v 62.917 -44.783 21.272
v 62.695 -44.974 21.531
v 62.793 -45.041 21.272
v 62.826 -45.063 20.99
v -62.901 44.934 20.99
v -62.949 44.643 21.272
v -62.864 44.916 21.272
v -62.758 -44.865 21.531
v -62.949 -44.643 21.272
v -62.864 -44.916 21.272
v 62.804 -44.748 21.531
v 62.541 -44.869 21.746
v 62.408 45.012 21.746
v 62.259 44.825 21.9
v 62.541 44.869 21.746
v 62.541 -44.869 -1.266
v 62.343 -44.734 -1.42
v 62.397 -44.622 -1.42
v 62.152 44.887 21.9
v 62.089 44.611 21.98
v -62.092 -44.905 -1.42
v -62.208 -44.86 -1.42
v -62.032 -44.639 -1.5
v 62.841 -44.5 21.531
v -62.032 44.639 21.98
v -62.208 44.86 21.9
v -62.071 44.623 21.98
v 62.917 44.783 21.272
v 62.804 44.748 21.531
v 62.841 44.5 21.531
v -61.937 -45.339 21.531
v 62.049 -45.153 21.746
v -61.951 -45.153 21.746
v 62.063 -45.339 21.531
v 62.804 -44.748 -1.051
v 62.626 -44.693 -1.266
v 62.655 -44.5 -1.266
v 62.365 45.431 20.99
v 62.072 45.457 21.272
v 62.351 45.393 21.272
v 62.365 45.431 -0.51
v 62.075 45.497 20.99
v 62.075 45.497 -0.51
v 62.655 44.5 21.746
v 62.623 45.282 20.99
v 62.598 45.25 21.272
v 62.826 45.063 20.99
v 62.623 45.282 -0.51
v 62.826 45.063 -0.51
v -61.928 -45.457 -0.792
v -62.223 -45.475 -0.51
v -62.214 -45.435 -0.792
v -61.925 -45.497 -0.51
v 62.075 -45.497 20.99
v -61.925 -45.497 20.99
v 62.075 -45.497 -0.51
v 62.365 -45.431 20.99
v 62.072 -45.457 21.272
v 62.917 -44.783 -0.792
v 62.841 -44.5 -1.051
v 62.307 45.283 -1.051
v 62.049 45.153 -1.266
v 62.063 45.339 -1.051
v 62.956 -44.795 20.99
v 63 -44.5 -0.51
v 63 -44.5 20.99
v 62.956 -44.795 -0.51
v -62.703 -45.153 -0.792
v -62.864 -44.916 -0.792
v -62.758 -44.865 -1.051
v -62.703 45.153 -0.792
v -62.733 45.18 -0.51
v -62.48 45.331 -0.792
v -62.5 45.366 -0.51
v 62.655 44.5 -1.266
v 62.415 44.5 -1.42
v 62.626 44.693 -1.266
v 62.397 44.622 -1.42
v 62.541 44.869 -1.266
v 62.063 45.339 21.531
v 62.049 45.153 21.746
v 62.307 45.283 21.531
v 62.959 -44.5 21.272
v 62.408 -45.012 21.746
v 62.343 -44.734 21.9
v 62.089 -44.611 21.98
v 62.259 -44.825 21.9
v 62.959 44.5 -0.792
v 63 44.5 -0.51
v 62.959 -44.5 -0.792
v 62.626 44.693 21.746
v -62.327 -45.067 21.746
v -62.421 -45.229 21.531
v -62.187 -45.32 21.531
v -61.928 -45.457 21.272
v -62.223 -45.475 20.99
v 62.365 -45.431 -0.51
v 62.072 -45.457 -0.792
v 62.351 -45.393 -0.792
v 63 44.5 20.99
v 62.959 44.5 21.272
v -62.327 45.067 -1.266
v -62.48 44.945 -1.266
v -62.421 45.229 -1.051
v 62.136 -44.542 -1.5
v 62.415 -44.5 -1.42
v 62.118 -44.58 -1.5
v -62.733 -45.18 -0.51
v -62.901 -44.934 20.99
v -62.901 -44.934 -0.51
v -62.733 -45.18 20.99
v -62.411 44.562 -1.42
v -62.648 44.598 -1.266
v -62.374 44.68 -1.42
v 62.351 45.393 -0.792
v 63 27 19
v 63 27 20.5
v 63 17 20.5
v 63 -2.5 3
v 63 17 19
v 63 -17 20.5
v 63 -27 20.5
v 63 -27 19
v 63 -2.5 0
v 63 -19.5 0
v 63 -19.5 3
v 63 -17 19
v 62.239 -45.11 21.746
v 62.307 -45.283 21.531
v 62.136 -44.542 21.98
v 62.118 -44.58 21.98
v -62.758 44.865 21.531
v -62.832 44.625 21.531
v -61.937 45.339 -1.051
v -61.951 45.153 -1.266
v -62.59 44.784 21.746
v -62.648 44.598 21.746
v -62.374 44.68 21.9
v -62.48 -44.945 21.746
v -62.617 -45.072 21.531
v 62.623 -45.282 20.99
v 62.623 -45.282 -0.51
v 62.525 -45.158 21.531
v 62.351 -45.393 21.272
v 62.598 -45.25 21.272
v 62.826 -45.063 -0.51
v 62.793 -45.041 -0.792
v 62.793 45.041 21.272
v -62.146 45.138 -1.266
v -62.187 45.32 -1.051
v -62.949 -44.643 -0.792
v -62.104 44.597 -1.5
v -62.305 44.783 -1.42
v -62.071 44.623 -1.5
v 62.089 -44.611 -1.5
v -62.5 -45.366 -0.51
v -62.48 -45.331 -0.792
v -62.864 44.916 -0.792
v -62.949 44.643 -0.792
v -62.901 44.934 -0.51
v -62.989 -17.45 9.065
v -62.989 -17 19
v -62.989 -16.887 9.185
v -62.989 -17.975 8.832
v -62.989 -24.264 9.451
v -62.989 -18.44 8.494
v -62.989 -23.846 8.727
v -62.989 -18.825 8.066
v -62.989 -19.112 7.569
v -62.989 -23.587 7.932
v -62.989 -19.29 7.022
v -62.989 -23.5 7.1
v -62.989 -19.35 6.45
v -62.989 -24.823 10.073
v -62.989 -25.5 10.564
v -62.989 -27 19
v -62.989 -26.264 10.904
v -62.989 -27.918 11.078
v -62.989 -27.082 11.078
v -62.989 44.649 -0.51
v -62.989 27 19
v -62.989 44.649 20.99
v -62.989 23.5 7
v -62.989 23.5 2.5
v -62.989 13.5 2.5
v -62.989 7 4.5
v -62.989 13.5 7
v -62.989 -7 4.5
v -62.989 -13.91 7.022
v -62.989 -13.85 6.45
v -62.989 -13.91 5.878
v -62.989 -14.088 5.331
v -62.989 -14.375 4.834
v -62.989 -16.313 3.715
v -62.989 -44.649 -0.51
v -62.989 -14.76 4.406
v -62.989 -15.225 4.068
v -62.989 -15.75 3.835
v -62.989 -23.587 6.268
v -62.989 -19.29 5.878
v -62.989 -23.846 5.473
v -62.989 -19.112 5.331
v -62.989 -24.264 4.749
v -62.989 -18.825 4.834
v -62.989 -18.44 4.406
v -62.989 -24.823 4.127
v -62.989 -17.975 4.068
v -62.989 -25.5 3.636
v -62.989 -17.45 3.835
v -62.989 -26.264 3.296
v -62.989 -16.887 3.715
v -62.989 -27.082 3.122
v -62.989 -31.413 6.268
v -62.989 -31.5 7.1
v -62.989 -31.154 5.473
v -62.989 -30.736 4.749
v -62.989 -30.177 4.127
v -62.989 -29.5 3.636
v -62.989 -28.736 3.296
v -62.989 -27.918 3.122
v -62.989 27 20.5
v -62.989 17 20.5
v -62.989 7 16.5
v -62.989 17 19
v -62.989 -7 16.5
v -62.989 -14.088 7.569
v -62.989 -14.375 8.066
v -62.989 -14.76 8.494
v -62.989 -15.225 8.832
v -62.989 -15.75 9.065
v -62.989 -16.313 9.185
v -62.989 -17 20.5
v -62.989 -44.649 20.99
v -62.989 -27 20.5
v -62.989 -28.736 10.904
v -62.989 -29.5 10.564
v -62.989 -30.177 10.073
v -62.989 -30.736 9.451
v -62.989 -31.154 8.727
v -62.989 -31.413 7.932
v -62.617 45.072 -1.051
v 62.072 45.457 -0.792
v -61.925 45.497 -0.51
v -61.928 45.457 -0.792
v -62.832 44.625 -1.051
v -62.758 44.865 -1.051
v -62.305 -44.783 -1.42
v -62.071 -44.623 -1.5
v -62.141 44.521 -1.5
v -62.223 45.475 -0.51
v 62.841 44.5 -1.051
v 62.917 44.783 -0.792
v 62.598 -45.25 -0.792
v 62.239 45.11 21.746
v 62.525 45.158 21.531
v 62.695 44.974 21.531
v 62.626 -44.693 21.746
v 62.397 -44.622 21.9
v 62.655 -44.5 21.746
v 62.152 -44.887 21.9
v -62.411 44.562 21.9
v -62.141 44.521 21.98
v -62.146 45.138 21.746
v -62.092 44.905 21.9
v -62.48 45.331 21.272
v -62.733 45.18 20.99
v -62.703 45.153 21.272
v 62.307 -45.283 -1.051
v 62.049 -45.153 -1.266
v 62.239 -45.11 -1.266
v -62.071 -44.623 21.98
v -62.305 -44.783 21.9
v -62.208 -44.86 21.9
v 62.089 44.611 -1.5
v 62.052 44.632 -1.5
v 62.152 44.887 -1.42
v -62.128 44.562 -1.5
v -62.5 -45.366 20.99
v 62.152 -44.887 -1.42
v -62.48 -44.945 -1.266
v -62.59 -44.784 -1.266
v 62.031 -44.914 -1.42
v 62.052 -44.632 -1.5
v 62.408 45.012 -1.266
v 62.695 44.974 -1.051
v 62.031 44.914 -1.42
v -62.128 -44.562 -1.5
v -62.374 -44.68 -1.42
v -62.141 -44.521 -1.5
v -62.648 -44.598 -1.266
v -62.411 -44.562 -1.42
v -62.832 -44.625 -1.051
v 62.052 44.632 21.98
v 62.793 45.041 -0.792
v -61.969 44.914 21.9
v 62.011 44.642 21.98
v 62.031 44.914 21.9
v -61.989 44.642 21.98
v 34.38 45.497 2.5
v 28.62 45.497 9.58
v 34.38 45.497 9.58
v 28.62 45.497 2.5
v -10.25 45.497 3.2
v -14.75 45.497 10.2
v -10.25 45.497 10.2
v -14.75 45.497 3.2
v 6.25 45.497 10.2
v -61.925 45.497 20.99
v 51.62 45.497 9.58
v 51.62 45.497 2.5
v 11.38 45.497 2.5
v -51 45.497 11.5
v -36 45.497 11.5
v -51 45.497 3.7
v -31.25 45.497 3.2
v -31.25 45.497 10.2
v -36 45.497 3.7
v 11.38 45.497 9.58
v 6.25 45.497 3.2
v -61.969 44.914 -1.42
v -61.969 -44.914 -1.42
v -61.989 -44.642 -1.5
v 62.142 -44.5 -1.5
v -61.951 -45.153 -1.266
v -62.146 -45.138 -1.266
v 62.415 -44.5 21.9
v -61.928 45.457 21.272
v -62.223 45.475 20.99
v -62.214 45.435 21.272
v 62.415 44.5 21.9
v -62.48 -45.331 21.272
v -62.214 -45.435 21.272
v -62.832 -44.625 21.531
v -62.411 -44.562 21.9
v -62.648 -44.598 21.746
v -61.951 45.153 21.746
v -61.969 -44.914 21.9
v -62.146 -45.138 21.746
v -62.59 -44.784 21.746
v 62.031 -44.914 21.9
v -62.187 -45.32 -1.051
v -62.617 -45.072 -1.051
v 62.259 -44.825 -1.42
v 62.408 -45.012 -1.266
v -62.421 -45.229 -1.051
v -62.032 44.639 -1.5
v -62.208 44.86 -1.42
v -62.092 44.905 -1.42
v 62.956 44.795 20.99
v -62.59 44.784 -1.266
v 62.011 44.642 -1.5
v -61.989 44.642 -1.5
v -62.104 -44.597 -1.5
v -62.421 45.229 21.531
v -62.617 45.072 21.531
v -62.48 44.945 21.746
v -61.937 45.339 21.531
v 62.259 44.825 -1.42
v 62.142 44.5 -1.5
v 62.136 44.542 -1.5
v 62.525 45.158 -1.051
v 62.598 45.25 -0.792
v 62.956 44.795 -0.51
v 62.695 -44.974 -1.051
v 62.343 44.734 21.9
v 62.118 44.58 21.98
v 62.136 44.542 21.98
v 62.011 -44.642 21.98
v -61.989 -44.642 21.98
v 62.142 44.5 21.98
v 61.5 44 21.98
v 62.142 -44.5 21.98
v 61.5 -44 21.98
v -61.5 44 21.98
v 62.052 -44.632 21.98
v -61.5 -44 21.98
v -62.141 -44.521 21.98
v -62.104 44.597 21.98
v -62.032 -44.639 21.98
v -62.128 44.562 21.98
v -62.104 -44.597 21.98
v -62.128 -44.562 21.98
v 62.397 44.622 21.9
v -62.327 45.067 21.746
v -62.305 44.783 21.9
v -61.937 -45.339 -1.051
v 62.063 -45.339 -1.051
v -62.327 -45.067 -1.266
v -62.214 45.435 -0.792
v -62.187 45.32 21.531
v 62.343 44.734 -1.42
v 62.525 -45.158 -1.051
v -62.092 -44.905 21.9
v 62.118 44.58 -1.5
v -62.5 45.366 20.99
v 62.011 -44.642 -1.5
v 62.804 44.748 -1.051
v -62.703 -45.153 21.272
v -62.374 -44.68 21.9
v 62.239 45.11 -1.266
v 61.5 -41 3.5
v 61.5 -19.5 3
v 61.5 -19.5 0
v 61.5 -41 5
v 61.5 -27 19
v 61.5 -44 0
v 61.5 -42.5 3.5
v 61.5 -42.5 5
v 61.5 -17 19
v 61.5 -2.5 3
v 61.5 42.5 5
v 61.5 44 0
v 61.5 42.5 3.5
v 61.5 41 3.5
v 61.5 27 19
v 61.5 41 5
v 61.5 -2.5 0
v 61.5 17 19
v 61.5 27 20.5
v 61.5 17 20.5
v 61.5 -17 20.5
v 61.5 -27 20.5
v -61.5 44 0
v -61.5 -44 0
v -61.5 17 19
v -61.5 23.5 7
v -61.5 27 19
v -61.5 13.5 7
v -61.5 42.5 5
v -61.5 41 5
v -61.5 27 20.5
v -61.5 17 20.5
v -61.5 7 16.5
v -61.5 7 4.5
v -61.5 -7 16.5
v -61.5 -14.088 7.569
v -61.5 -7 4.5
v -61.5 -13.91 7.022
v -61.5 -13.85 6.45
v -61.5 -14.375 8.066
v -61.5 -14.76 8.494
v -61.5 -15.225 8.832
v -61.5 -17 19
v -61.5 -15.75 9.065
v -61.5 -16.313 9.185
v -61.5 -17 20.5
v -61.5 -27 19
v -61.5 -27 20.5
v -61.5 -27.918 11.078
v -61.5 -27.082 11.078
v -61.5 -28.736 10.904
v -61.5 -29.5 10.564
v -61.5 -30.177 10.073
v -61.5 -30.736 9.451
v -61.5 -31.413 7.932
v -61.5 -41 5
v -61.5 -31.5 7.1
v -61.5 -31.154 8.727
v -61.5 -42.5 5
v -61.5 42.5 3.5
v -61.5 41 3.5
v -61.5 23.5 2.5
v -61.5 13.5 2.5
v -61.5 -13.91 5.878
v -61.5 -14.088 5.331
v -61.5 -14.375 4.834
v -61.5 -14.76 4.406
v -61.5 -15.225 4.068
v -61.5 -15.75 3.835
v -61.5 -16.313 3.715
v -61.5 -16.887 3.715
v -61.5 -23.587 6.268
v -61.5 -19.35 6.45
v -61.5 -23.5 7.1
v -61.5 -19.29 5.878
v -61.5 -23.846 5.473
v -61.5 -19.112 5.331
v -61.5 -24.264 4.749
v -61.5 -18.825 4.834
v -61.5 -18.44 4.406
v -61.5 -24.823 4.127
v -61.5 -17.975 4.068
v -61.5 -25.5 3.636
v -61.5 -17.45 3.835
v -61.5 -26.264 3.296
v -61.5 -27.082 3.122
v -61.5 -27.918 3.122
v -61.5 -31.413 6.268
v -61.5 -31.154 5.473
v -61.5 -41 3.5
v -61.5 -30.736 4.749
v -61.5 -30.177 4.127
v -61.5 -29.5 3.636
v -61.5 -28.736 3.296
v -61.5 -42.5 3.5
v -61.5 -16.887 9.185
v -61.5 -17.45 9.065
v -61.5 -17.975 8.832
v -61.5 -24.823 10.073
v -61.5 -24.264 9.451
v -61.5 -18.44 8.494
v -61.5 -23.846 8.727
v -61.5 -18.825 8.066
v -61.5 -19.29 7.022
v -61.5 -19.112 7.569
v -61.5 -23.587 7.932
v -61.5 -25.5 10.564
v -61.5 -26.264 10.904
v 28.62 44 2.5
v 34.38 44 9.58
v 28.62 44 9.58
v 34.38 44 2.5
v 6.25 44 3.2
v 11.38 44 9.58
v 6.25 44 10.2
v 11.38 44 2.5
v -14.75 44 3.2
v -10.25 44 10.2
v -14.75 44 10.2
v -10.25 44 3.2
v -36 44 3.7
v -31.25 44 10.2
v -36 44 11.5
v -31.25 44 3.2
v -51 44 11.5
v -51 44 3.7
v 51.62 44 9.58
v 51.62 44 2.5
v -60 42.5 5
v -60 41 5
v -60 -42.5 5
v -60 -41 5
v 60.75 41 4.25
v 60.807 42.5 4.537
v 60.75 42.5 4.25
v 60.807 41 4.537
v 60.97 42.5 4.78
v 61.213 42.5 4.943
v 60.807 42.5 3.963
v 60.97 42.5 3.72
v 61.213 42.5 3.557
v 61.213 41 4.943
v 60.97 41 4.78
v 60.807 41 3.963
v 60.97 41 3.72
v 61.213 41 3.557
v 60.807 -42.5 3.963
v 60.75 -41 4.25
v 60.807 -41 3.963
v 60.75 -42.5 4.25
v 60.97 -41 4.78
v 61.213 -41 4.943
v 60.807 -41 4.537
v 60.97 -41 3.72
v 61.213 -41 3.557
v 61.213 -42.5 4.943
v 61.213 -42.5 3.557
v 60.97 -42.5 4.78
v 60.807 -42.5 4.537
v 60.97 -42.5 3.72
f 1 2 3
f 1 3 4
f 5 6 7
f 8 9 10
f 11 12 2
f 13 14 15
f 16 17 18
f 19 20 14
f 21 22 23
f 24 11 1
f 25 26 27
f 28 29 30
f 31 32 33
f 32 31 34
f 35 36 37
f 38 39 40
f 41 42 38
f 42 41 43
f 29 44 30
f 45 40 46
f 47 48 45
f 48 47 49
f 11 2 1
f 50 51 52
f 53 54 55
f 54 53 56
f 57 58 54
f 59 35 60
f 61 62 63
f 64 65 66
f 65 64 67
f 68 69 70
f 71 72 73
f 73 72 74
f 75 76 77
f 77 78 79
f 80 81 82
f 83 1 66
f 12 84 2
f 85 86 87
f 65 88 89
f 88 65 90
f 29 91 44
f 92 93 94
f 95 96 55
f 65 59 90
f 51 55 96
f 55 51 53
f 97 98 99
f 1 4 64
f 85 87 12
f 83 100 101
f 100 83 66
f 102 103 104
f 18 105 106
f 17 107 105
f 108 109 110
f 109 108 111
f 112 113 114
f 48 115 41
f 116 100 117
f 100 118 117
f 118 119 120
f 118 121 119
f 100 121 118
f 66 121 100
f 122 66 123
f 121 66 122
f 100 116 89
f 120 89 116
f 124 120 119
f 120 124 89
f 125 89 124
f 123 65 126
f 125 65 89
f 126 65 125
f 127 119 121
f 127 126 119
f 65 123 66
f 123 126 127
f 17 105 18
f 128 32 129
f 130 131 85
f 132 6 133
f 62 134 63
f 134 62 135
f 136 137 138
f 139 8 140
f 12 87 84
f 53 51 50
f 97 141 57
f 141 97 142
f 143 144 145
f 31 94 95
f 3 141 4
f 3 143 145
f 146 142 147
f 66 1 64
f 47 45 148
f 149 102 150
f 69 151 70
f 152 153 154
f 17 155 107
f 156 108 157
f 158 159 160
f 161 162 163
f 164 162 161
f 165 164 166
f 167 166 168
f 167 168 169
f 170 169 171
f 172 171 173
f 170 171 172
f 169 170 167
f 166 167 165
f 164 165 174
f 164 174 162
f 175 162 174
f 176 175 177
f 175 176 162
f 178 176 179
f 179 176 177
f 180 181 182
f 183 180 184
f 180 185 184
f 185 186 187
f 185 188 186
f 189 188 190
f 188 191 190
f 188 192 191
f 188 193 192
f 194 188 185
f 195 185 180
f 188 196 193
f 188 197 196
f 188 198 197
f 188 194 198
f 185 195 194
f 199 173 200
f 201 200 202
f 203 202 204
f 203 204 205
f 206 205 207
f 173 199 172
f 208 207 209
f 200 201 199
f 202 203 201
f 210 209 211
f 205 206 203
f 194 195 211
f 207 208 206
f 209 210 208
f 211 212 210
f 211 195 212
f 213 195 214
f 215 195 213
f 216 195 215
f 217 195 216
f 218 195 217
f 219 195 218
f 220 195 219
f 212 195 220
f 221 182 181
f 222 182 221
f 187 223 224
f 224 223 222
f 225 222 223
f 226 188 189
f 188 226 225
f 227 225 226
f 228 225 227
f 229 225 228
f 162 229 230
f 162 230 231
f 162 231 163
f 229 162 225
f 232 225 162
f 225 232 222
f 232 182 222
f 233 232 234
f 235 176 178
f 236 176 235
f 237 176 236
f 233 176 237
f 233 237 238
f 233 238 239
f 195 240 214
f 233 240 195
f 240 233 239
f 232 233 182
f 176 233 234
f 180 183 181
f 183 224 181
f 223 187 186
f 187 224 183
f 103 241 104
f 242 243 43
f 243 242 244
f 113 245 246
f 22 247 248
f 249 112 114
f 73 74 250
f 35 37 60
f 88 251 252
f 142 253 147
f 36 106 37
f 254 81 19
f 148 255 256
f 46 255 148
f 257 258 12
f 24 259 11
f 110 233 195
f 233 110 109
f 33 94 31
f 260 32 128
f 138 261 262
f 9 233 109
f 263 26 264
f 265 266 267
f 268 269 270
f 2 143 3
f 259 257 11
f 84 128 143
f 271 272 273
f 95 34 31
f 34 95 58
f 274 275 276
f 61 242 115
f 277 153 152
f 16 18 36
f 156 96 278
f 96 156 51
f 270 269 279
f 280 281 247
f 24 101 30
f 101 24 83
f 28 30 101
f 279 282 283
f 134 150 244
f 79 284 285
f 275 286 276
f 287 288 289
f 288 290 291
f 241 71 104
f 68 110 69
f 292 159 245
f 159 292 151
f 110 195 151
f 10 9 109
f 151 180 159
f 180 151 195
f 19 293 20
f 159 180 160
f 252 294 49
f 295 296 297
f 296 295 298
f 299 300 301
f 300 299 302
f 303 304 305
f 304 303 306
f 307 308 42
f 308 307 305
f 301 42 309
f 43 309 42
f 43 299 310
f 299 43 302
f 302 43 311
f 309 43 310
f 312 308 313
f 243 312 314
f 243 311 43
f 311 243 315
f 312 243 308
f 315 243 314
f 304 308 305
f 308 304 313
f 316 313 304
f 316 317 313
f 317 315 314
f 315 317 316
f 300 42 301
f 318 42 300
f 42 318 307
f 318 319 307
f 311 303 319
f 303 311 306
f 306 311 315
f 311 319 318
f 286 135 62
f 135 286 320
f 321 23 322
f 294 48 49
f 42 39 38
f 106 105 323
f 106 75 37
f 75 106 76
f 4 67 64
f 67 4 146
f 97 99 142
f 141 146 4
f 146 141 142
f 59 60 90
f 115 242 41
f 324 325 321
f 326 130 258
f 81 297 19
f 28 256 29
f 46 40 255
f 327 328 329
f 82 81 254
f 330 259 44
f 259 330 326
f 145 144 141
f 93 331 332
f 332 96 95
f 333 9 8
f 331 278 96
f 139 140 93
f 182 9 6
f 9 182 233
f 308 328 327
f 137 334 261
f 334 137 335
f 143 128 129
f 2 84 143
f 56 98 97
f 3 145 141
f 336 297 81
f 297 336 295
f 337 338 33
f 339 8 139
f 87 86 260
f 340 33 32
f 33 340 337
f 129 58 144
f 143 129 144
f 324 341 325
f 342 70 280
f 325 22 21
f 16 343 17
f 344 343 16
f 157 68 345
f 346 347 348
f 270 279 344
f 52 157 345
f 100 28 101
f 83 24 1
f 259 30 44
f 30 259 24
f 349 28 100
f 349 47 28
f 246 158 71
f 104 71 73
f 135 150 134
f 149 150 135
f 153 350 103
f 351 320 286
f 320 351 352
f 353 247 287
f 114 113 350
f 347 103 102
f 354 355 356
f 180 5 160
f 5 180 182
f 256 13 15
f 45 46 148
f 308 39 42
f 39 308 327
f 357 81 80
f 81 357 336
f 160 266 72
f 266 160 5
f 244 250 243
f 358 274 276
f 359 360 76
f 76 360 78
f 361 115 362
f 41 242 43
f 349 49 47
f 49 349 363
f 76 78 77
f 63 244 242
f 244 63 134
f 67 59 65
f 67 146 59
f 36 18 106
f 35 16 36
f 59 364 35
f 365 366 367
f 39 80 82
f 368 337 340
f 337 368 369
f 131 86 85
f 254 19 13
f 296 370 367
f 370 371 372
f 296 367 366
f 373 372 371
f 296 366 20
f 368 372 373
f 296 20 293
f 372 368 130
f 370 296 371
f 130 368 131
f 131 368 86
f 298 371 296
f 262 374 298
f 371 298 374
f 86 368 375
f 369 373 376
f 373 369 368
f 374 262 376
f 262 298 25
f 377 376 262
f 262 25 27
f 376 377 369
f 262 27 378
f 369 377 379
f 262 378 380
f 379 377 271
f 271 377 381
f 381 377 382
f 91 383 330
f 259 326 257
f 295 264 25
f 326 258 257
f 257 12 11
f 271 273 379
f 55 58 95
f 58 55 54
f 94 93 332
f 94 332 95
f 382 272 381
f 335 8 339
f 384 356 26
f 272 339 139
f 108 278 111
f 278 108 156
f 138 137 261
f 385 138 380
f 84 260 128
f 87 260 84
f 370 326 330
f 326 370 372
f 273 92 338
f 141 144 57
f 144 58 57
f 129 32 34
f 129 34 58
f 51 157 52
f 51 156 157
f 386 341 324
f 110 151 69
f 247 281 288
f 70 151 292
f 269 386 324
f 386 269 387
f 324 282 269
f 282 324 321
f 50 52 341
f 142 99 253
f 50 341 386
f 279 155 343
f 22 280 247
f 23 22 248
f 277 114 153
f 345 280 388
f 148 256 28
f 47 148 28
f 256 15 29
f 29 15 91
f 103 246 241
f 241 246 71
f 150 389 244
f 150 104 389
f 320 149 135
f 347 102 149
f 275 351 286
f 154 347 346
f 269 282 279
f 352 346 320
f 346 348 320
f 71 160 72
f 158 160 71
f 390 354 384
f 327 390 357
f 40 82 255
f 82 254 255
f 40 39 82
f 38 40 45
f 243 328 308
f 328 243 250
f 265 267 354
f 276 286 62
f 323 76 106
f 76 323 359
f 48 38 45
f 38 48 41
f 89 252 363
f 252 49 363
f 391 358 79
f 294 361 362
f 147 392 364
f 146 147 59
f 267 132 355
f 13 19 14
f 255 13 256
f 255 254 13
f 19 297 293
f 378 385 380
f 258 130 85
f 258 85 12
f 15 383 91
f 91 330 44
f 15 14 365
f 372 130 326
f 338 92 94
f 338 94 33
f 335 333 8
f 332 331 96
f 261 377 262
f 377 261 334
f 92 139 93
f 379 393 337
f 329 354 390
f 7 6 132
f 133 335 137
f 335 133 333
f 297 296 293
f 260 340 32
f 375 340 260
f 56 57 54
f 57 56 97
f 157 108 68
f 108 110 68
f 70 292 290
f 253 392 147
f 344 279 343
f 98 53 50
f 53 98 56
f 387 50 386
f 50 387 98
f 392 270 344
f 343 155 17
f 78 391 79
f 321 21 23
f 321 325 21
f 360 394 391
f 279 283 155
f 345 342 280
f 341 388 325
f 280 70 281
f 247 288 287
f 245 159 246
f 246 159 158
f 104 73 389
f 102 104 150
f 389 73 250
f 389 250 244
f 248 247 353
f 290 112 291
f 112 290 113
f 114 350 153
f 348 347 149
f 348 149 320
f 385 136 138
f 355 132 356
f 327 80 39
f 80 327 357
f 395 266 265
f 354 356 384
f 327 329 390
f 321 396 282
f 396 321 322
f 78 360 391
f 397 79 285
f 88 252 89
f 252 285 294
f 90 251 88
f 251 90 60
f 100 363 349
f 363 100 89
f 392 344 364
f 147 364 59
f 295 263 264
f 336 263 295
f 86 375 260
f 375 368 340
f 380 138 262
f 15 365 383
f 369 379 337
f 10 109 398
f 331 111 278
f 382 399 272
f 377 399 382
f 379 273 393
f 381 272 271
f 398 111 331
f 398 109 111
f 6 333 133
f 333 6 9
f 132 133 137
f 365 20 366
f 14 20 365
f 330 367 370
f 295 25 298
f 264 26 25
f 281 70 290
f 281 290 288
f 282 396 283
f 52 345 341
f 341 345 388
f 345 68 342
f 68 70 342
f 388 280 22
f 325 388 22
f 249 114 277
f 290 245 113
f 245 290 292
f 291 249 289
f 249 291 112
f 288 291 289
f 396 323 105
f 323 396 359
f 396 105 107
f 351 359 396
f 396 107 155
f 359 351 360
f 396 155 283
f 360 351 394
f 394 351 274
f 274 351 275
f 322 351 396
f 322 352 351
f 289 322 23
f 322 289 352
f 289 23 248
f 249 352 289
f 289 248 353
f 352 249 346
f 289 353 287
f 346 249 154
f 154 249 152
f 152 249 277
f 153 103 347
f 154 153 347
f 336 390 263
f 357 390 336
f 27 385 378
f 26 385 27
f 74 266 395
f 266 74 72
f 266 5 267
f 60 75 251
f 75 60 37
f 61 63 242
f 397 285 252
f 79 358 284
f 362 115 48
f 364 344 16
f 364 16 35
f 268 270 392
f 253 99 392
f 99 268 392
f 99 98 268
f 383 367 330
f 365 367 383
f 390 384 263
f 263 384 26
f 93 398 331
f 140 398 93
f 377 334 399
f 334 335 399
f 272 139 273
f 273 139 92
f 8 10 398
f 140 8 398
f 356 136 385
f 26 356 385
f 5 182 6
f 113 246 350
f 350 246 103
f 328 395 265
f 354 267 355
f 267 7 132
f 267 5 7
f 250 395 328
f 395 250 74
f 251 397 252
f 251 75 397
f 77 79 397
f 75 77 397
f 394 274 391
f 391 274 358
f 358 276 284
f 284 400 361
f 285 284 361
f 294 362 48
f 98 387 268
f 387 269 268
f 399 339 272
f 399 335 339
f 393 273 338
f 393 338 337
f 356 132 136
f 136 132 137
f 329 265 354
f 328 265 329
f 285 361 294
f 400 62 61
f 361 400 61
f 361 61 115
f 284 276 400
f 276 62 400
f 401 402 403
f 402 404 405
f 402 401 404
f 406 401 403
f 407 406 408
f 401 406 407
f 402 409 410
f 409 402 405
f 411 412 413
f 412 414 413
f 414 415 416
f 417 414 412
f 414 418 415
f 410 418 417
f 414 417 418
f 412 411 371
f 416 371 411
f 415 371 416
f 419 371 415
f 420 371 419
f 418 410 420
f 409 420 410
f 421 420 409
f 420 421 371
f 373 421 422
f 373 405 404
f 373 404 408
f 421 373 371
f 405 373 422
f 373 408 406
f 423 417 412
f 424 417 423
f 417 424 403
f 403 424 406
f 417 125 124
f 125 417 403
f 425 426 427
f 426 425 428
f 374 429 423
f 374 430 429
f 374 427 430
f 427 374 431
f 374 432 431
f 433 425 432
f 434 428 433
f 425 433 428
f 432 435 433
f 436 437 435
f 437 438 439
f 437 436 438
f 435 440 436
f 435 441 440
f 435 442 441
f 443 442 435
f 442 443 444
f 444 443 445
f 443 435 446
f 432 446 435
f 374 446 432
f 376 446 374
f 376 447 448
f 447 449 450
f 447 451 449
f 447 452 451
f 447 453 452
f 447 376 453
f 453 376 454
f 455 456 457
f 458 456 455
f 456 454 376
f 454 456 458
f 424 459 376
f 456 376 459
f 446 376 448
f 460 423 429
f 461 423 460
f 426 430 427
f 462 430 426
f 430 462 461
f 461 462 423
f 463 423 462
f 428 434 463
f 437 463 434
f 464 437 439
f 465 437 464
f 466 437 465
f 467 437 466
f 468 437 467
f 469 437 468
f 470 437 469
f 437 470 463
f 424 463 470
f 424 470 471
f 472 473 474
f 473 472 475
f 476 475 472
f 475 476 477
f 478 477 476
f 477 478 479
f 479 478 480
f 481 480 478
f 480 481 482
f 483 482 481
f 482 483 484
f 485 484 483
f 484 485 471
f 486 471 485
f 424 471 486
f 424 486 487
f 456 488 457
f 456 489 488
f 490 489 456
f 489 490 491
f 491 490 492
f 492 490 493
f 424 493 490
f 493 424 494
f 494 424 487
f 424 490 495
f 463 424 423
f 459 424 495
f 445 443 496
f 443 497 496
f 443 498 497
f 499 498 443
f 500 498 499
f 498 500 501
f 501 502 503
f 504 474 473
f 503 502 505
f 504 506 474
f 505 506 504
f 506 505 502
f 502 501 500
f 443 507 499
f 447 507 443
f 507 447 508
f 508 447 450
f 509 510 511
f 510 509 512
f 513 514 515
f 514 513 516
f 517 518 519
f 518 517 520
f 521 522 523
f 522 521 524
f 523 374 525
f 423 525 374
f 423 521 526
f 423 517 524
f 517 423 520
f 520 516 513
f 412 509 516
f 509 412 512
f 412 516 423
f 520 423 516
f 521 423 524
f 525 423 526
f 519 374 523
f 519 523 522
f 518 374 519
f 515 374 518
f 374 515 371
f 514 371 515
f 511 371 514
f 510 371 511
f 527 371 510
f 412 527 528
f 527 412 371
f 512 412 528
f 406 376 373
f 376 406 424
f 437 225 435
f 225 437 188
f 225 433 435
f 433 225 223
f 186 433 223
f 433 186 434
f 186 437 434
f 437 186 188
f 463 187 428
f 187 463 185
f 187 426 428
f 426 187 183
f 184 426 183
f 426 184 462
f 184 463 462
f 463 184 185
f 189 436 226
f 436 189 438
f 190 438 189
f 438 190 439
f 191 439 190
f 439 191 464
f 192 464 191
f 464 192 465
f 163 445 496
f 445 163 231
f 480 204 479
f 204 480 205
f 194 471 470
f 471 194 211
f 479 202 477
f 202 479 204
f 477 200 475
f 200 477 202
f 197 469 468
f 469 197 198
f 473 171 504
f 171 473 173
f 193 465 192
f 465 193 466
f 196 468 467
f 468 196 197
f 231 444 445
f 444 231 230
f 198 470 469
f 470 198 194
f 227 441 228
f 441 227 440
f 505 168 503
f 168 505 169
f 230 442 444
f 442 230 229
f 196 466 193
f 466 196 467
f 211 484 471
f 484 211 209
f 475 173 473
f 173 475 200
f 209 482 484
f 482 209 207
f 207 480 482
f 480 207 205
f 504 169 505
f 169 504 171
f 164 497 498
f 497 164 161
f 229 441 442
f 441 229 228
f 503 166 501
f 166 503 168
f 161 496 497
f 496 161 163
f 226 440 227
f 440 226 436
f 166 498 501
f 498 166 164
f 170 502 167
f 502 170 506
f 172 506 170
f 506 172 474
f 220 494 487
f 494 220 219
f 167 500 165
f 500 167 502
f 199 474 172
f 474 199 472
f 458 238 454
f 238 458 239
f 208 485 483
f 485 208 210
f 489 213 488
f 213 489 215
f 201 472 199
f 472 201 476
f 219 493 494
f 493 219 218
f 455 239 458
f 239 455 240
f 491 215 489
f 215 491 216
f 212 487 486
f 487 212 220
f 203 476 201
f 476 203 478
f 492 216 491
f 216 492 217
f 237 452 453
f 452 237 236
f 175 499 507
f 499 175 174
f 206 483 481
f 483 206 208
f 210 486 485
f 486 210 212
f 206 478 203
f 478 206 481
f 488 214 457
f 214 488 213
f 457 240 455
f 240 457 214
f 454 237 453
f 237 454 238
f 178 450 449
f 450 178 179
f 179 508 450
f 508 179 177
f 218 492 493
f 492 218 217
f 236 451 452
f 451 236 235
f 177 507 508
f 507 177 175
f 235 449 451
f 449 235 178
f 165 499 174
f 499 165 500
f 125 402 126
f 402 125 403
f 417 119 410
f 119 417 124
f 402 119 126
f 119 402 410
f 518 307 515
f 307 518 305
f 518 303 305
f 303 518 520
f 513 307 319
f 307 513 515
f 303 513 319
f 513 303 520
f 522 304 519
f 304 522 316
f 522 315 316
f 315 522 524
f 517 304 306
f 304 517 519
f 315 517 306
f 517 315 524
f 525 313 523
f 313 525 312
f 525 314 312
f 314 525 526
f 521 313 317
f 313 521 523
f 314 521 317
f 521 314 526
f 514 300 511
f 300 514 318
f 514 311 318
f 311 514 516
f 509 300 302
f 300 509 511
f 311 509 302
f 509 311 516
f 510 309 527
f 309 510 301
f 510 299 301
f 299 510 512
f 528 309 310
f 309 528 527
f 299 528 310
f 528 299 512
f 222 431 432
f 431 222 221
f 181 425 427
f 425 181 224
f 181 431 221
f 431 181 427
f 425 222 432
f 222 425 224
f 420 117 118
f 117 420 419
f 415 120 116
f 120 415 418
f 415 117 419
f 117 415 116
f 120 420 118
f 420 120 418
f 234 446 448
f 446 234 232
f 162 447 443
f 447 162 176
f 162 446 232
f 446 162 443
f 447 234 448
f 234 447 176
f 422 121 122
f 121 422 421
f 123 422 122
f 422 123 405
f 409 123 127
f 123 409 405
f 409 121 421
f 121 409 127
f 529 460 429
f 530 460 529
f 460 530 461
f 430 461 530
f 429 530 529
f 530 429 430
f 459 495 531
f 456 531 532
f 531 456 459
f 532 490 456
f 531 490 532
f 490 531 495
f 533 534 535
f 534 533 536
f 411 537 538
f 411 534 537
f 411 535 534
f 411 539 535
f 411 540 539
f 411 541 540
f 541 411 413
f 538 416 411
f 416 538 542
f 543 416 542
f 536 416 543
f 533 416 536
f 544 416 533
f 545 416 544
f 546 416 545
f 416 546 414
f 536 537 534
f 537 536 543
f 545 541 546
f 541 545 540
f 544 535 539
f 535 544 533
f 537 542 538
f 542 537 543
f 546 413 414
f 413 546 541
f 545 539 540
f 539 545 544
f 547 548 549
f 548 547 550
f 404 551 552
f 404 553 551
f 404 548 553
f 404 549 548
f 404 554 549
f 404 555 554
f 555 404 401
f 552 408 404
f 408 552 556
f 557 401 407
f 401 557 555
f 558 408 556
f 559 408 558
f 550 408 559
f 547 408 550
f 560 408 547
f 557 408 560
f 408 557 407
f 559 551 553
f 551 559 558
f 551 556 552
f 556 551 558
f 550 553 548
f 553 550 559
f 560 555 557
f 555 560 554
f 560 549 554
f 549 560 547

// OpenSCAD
// file: vars.scad
$fs = 0.3;

epsilon = 0.01;
wall_thickness = 1.5;
rounded_corner_radius = 1;
board_thickness = 1.5;
board_sit_height = 2;
inner_dim = [123, 88, 22];
mid_dist = [inner_dim[0]/2 + wall_thickness/2, inner_dim[1]/2 + wall_thickness/2, inner_dim[2]/2 + wall_thickness/2];

top_tab_width = 10;
top_tab_thickness = 1.5;
text_height = 0.5;
// file: roundedcube.scad
// https://danielupshaw.com/openscad-rounded-corners/
module roundedcube(size = [1, 1, 1], center = false, radius = 0.5, apply_to = "all") {
	// If single value, convert to [x, y, z] vector
	size = (size[0] == undef) ? [size, size, size] : size;

	translate_min = radius;
	translate_xmax = size[0] - radius;
	translate_ymax = size[1] - radius;
	translate_zmax = size[2] - radius;

	diameter = radius * 2;

	obj_translate = (center == false) ?
		[0, 0, 0] : [
			-(size[0] / 2),
			-(size[1] / 2),
			-(size[2] / 2)
		];

	translate(v = obj_translate) {
		hull() {
			for (translate_x = [translate_min, translate_xmax]) {
				x_at = (translate_x == translate_min) ? "min" : "max";
				for (translate_y = [translate_min, translate_ymax]) {
					y_at = (translate_y == translate_min) ? "min" : "max";
					for (translate_z = [translate_min, translate_zmax]) {
						z_at = (translate_z == translate_min) ? "min" : "max";

						translate(v = [translate_x, translate_y, translate_z])
						if (
							(apply_to == "all") ||
							(apply_to == "xmin" && x_at == "min") || (apply_to == "xmax" && x_at == "max") ||
							(apply_to == "ymin" && y_at == "min") || (apply_to == "ymax" && y_at == "max") ||
							(apply_to == "zmin" && z_at == "min") || (apply_to == "zmax" && z_at == "max")
						) {
							sphere(r = radius);
						} else {
							rotate =
								(apply_to == "xmin" || apply_to == "xmax" || apply_to == "x") ? [0, 90, 0] : (
								(apply_to == "ymin" || apply_to == "ymax" || apply_to == "y") ? [90, 90, 0] :
								[0, 0, 0]
							);
							rotate(a = rotate)
							cylinder(h = diameter, r = radius, center = true);
						}
					}
				}
			}
		}
	}
}
// file: cutouts.scad
margin = 1;

module _square(w, h) {
	translate([0, h/2])
	square([w+2*margin, h+2*margin], center=true);
}

module _circle(r) {
	translate([0, r])
	circle(r + margin);
}

module hdmi() {
	translate([0, 0.7, 0]) _square(14.5, 5);
}

module usb() {
	translate([0, 1.2, 0]) _square(13, 5.8);
}

module dip(w, h, ) {
	_square(2.54*w, 2.54*h);
}

module rj45() {
	translate([0, 2, 0])
	_square(12, 10);
}

module microusb() {
	_square(8, 2.5);
}

module audio() {
	translate([0, 1.2, 0])
	_circle(1.75);
}

module dc() {
	translate([0, 0.6, 0])
	_circle(3);
}

module microsd() {
	_square(15, 1);
}
// main file
use <cutouts.scad>
use <roundedcube.scad>
include <vars.scad>

module bottom() {
	module cutout() {
		translate([0, 0, board_thickness+board_sit_height])
		rotate([90, 0, 0])
		linear_extrude(wall_thickness+epsilon, center=true)
		children();
	}

	module cutout_below() {
		translate([0, 0, board_sit_height])
		rotate([-90, 0, 0])
		linear_extrude(wall_thickness+epsilon, center=true)
		children();
	}

	module tab_cutout() {
		// top tab cutout
		translate([-mid_dist[0], inner_dim[1]/4, inner_dim[2] - top_tab_thickness/2 - wall_thickness])
			cube([
				wall_thickness + epsilon,
				top_tab_width,
				top_tab_thickness,
			], center=true);
	}

	difference() {
		// base hollow box
		difference() {
			translate([0, 0, inner_dim[2]/2 - wall_thickness/2 - epsilon])
			roundedcube([
				inner_dim[0] + 2*wall_thickness,
				inner_dim[1] + 2*wall_thickness,
				inner_dim[2] + wall_thickness,
			], center=true, radius=rounded_corner_radius, apply_to="all");

			translate([0, 0, inner_dim[2]/2])
			cube([
				inner_dim[0],
				inner_dim[1],
				inner_dim[2],
			], center=true);
		}

		// port cutouts
		translate([-mid_dist[0], +00.0, 0]) rotate([0, 0, 90]) cutout() rj45();
		translate([-mid_dist[0], +18.5, 0]) rotate([0, 0, 90]) cutout() microusb();
		translate([-mid_dist[0], -16.6, 0]) rotate([0, 0, 90]) cutout() audio();
		translate([-mid_dist[0], -27.5, 0]) rotate([0, 0, 90]) cutout() dc();

		translate([+mid_dist[0], -11.0, 0]) rotate([0, 0, 90]) cutout_below() microsd();

		translate([-02.0, mid_dist[1], 0]) cutout() hdmi();
		translate([-23.0, mid_dist[1], 0]) cutout() hdmi();
		translate([-43.5, mid_dist[1], 0]) cutout() usb();
		translate([+20.0, mid_dist[1], 0]) cutout() dip(6, 2);
		translate([+43.0, mid_dist[1], 0]) cutout() dip(6, 2);

		// tab cutouts
		tab_cutout();
		mirror([1, 0, 0]) tab_cutout();
		mirror([0, 1, 0]) tab_cutout();
		mirror([1, 0, 0]) mirror([0, 1, 0]) tab_cutout();

	}

	module _tab() {
		translate([-inner_dim[0]/2, inner_dim[1]/2 - wall_thickness, board_sit_height+board_thickness])
		rotate([90, 0, 0])
		linear_extrude(wall_thickness)
		children();
	}

	// tabs to keep board in
	module big_board_tab() {
		_tab() polygon([
			[-epsilon, -epsilon],
			[-epsilon, wall_thickness],
			[wall_thickness, wall_thickness]
		]);
	}
	big_board_tab();
	mirror([0, 1, 0]) big_board_tab();

	module small_board_tab() {
		_tab() translate([0, wall_thickness/2]) circle(wall_thickness/2);
	}
	mirror([1, 0, 0]) small_board_tab();
	mirror([1, 0, 0]) mirror([0, 1, 0]) small_board_tab();
}

bottom();
